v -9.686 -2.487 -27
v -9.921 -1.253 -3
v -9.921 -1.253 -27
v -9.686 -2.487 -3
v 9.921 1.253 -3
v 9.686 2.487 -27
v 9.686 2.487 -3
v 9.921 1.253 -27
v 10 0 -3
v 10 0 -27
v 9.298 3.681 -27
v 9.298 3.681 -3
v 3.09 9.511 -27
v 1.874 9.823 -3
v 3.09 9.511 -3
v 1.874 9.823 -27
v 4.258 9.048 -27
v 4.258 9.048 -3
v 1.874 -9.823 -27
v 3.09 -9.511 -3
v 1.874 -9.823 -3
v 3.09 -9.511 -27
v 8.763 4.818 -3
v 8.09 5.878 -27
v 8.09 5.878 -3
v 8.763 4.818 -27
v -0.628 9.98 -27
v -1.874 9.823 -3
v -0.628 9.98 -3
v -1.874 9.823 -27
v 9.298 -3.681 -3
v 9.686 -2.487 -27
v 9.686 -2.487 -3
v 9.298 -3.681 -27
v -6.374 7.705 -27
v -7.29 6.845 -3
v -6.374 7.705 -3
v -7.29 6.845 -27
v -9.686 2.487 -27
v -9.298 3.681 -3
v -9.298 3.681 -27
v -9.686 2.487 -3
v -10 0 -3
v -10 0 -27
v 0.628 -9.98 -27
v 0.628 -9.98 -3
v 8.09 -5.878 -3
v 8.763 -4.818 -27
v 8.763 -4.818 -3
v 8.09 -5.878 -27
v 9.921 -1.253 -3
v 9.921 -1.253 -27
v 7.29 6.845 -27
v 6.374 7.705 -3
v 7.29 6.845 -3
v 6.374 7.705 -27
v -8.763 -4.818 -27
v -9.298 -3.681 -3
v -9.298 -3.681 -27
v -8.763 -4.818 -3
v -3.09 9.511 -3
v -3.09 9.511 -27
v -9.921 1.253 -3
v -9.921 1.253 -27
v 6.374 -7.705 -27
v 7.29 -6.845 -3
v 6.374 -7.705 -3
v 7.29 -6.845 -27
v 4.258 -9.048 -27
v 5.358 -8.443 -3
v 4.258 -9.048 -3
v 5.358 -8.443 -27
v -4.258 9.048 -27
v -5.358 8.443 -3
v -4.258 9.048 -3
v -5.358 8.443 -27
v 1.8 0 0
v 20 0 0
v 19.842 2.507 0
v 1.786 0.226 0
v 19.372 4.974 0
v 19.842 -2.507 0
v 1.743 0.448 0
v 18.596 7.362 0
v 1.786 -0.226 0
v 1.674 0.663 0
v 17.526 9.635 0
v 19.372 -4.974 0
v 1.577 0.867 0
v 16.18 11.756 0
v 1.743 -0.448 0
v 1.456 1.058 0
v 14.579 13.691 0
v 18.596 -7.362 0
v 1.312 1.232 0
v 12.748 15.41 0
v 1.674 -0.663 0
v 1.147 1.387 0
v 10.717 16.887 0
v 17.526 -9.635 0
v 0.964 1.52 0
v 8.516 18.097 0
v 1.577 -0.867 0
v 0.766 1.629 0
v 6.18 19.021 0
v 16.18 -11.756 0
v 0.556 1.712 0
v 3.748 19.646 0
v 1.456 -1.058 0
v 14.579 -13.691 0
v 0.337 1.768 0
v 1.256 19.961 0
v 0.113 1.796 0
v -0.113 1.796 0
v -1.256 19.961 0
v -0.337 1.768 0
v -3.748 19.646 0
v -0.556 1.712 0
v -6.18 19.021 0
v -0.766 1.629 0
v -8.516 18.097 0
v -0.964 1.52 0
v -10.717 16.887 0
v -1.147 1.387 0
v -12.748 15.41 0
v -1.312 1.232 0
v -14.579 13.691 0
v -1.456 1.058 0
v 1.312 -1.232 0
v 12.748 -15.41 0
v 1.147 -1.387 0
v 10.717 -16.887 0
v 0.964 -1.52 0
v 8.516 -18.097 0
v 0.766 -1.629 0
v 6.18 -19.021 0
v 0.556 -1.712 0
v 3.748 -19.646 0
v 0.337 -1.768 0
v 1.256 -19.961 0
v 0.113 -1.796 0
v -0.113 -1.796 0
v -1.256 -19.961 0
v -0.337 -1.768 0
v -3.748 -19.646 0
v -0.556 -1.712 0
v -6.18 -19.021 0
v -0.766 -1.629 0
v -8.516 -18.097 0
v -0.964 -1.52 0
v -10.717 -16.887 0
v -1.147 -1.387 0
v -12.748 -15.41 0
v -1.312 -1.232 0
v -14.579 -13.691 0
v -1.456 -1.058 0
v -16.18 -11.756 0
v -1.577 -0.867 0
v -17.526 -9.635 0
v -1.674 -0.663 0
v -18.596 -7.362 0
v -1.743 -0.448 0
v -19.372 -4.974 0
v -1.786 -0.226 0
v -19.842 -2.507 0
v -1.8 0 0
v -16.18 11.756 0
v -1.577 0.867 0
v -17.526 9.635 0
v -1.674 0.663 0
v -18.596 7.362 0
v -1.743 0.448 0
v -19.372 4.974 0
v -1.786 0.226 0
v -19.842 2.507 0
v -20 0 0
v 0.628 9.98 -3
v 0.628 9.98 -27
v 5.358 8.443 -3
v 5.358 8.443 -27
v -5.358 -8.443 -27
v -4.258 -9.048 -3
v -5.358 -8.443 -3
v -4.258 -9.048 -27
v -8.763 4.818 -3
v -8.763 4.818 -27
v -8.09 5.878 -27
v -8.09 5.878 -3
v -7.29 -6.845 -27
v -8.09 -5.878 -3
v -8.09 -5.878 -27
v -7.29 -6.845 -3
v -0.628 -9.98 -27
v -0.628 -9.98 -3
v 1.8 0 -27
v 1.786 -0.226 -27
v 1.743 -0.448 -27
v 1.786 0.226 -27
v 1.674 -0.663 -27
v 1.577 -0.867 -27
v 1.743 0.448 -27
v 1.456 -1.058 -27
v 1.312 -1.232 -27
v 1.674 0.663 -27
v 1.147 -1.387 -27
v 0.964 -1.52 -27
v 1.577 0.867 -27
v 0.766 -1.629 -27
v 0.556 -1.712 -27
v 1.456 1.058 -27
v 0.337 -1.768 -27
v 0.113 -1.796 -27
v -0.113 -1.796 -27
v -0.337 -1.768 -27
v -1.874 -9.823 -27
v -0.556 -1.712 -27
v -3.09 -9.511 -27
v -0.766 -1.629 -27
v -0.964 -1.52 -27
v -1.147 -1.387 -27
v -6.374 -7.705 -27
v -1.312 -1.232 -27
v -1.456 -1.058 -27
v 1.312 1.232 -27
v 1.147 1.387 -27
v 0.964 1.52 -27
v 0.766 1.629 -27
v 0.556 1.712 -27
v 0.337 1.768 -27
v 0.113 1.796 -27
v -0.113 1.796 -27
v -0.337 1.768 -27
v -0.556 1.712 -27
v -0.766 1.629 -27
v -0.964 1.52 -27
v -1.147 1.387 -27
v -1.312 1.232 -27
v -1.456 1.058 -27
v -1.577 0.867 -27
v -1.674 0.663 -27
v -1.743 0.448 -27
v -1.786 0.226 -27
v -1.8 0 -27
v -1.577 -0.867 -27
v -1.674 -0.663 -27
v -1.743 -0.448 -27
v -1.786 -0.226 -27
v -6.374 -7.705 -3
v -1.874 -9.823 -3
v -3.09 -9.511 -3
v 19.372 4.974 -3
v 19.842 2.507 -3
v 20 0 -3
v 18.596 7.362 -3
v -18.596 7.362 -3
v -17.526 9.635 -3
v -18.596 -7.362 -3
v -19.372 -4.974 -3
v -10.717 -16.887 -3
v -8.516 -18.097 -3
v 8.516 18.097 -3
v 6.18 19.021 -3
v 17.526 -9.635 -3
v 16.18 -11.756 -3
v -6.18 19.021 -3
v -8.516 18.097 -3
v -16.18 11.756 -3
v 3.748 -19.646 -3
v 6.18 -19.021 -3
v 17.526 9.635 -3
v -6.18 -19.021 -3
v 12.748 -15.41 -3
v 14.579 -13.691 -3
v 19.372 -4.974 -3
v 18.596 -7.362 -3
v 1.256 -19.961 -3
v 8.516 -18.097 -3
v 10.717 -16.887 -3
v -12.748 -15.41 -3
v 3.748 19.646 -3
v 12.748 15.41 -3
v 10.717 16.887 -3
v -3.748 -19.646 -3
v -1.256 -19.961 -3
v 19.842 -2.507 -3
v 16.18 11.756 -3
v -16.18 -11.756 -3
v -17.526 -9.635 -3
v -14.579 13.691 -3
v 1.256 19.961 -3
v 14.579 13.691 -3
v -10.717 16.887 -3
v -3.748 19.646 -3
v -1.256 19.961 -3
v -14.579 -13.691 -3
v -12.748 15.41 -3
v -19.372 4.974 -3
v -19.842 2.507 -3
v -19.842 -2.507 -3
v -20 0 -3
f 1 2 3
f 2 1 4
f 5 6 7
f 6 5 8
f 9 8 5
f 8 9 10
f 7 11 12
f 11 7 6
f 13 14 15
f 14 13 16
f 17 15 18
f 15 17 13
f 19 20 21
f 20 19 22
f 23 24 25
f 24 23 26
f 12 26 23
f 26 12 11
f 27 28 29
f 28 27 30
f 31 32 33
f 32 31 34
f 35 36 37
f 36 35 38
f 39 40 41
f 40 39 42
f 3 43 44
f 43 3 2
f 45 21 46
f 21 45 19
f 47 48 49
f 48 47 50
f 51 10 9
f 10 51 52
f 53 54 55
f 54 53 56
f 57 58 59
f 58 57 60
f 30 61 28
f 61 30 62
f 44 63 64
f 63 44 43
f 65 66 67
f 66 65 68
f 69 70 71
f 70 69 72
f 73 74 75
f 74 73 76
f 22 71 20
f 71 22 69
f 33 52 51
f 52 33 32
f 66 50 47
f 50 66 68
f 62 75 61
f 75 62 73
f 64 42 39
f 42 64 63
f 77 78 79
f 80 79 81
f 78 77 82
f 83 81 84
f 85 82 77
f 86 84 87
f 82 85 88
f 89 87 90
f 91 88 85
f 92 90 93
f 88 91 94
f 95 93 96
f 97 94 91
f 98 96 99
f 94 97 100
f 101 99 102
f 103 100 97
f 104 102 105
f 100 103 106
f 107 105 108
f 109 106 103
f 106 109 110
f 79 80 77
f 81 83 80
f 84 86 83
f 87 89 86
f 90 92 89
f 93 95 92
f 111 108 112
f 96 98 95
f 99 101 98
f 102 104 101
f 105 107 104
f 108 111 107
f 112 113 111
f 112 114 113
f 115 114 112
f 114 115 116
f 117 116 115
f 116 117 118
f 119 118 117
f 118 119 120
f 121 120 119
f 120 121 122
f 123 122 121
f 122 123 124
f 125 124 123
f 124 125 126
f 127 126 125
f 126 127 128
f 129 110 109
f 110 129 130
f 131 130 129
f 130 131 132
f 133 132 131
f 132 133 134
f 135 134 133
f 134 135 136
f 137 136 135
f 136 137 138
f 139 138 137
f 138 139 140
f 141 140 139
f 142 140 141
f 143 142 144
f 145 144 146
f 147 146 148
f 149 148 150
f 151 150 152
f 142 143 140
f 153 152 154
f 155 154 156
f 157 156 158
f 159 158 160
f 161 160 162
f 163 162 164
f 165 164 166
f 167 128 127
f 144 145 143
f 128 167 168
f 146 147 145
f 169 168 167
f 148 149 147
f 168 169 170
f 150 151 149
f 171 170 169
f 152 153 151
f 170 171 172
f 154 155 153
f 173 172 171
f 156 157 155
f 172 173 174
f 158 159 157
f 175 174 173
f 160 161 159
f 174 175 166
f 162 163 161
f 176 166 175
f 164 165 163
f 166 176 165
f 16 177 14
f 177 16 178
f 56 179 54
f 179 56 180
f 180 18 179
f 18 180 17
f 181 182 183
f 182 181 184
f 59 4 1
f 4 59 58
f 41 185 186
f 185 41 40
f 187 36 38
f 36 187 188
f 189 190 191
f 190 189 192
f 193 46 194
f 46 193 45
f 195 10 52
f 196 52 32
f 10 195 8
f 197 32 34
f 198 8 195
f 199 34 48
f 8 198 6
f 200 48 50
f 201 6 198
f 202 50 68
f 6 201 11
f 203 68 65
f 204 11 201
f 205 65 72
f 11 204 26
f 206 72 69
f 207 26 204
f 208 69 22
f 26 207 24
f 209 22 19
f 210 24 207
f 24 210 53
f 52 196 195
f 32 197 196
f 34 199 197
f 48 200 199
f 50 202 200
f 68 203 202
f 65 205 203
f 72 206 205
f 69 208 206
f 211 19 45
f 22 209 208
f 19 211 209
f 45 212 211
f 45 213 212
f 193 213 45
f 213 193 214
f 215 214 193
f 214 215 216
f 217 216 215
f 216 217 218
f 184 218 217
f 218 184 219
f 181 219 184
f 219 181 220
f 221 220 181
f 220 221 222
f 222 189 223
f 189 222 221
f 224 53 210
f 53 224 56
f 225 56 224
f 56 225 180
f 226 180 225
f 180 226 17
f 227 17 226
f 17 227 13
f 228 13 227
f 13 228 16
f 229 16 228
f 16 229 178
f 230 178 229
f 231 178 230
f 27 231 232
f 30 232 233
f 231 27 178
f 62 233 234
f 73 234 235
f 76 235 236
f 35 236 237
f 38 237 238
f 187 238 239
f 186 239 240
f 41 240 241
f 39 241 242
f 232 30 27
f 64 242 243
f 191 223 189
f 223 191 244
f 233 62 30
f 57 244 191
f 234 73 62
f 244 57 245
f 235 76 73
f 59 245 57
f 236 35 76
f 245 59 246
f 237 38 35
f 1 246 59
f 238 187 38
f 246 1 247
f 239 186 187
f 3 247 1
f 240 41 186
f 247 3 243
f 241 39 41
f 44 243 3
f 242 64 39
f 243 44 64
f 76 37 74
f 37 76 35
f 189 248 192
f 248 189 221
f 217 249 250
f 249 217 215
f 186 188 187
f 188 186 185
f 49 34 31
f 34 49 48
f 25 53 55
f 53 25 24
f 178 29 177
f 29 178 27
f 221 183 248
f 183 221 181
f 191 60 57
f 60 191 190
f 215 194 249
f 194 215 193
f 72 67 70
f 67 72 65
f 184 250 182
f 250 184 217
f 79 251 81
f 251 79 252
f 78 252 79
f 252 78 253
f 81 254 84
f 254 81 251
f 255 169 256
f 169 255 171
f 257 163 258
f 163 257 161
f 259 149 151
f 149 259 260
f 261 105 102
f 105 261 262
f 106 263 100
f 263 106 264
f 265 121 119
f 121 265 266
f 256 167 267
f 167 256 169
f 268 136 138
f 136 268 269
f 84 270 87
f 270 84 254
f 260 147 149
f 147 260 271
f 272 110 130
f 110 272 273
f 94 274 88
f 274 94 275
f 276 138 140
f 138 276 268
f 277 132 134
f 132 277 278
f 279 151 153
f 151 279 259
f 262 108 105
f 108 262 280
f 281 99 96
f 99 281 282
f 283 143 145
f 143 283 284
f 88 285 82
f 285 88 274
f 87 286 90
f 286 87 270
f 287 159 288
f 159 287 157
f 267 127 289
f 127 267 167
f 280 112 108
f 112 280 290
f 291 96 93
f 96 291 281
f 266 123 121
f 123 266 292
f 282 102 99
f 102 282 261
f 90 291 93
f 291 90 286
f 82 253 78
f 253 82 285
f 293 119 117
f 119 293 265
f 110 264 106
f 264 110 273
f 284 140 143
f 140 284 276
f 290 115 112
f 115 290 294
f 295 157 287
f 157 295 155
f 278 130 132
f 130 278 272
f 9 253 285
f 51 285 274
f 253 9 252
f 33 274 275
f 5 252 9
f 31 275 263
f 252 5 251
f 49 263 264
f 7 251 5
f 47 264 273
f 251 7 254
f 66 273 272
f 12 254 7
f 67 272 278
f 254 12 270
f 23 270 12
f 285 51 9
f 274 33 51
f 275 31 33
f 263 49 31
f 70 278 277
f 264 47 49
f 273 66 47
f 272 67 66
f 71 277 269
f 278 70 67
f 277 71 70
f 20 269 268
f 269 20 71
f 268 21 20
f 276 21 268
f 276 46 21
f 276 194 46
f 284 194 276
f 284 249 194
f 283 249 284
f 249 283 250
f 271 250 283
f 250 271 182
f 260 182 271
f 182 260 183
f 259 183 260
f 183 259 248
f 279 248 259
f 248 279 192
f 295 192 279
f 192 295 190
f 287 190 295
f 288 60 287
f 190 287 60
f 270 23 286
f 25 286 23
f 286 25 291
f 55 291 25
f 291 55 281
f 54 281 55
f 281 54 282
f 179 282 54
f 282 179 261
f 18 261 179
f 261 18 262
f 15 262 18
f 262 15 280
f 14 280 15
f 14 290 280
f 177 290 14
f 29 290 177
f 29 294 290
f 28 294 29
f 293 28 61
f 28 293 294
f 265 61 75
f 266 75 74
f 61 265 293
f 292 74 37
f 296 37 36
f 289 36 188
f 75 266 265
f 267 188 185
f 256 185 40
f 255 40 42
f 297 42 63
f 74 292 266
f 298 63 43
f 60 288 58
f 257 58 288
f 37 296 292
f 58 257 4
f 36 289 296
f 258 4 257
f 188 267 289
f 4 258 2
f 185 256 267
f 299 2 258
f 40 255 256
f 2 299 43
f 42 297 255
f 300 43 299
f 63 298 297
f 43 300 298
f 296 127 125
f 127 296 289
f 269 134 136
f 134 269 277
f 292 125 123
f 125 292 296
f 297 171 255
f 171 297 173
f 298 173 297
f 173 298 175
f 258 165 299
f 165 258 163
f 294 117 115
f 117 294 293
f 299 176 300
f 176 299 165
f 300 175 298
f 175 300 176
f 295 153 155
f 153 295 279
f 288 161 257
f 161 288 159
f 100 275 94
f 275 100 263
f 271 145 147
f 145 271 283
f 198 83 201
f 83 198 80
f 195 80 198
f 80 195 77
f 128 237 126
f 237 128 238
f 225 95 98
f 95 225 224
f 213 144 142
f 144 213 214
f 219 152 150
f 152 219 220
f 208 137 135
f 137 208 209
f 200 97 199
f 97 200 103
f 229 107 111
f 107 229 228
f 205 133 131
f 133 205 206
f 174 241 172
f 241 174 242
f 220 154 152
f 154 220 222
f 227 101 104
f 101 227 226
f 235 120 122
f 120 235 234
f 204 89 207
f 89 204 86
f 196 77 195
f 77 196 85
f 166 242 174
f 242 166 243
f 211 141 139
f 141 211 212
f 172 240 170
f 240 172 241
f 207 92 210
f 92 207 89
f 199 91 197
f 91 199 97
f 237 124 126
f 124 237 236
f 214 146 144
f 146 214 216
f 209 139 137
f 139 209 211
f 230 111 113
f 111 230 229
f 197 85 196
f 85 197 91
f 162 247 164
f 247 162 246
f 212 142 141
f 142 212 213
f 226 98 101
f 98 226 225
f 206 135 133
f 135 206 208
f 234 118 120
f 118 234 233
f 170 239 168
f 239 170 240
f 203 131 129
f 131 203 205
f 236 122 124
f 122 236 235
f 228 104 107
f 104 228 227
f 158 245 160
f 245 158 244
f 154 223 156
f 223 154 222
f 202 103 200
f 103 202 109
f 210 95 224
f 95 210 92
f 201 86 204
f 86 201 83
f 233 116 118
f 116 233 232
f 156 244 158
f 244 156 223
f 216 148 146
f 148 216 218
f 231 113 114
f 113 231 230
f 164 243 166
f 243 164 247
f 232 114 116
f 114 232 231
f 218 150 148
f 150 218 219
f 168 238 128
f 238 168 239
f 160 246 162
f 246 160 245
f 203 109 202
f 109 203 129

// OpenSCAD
$fn = 50;


difference() {
	union() {
		translate(v = [0, 0, -27.0000000000]) {
			cylinder(h = 27, r = 10.0000000000);
		}
		translate(v = [0, 0, -3.0000000000]) {
			cylinder(h = 3, r = 20.0000000000);
		}
	}
	union() {
		#translate(v = [0, 0, -27]) {
			cylinder(h = 27, r = 1.8000000000);
		}
	}
}
